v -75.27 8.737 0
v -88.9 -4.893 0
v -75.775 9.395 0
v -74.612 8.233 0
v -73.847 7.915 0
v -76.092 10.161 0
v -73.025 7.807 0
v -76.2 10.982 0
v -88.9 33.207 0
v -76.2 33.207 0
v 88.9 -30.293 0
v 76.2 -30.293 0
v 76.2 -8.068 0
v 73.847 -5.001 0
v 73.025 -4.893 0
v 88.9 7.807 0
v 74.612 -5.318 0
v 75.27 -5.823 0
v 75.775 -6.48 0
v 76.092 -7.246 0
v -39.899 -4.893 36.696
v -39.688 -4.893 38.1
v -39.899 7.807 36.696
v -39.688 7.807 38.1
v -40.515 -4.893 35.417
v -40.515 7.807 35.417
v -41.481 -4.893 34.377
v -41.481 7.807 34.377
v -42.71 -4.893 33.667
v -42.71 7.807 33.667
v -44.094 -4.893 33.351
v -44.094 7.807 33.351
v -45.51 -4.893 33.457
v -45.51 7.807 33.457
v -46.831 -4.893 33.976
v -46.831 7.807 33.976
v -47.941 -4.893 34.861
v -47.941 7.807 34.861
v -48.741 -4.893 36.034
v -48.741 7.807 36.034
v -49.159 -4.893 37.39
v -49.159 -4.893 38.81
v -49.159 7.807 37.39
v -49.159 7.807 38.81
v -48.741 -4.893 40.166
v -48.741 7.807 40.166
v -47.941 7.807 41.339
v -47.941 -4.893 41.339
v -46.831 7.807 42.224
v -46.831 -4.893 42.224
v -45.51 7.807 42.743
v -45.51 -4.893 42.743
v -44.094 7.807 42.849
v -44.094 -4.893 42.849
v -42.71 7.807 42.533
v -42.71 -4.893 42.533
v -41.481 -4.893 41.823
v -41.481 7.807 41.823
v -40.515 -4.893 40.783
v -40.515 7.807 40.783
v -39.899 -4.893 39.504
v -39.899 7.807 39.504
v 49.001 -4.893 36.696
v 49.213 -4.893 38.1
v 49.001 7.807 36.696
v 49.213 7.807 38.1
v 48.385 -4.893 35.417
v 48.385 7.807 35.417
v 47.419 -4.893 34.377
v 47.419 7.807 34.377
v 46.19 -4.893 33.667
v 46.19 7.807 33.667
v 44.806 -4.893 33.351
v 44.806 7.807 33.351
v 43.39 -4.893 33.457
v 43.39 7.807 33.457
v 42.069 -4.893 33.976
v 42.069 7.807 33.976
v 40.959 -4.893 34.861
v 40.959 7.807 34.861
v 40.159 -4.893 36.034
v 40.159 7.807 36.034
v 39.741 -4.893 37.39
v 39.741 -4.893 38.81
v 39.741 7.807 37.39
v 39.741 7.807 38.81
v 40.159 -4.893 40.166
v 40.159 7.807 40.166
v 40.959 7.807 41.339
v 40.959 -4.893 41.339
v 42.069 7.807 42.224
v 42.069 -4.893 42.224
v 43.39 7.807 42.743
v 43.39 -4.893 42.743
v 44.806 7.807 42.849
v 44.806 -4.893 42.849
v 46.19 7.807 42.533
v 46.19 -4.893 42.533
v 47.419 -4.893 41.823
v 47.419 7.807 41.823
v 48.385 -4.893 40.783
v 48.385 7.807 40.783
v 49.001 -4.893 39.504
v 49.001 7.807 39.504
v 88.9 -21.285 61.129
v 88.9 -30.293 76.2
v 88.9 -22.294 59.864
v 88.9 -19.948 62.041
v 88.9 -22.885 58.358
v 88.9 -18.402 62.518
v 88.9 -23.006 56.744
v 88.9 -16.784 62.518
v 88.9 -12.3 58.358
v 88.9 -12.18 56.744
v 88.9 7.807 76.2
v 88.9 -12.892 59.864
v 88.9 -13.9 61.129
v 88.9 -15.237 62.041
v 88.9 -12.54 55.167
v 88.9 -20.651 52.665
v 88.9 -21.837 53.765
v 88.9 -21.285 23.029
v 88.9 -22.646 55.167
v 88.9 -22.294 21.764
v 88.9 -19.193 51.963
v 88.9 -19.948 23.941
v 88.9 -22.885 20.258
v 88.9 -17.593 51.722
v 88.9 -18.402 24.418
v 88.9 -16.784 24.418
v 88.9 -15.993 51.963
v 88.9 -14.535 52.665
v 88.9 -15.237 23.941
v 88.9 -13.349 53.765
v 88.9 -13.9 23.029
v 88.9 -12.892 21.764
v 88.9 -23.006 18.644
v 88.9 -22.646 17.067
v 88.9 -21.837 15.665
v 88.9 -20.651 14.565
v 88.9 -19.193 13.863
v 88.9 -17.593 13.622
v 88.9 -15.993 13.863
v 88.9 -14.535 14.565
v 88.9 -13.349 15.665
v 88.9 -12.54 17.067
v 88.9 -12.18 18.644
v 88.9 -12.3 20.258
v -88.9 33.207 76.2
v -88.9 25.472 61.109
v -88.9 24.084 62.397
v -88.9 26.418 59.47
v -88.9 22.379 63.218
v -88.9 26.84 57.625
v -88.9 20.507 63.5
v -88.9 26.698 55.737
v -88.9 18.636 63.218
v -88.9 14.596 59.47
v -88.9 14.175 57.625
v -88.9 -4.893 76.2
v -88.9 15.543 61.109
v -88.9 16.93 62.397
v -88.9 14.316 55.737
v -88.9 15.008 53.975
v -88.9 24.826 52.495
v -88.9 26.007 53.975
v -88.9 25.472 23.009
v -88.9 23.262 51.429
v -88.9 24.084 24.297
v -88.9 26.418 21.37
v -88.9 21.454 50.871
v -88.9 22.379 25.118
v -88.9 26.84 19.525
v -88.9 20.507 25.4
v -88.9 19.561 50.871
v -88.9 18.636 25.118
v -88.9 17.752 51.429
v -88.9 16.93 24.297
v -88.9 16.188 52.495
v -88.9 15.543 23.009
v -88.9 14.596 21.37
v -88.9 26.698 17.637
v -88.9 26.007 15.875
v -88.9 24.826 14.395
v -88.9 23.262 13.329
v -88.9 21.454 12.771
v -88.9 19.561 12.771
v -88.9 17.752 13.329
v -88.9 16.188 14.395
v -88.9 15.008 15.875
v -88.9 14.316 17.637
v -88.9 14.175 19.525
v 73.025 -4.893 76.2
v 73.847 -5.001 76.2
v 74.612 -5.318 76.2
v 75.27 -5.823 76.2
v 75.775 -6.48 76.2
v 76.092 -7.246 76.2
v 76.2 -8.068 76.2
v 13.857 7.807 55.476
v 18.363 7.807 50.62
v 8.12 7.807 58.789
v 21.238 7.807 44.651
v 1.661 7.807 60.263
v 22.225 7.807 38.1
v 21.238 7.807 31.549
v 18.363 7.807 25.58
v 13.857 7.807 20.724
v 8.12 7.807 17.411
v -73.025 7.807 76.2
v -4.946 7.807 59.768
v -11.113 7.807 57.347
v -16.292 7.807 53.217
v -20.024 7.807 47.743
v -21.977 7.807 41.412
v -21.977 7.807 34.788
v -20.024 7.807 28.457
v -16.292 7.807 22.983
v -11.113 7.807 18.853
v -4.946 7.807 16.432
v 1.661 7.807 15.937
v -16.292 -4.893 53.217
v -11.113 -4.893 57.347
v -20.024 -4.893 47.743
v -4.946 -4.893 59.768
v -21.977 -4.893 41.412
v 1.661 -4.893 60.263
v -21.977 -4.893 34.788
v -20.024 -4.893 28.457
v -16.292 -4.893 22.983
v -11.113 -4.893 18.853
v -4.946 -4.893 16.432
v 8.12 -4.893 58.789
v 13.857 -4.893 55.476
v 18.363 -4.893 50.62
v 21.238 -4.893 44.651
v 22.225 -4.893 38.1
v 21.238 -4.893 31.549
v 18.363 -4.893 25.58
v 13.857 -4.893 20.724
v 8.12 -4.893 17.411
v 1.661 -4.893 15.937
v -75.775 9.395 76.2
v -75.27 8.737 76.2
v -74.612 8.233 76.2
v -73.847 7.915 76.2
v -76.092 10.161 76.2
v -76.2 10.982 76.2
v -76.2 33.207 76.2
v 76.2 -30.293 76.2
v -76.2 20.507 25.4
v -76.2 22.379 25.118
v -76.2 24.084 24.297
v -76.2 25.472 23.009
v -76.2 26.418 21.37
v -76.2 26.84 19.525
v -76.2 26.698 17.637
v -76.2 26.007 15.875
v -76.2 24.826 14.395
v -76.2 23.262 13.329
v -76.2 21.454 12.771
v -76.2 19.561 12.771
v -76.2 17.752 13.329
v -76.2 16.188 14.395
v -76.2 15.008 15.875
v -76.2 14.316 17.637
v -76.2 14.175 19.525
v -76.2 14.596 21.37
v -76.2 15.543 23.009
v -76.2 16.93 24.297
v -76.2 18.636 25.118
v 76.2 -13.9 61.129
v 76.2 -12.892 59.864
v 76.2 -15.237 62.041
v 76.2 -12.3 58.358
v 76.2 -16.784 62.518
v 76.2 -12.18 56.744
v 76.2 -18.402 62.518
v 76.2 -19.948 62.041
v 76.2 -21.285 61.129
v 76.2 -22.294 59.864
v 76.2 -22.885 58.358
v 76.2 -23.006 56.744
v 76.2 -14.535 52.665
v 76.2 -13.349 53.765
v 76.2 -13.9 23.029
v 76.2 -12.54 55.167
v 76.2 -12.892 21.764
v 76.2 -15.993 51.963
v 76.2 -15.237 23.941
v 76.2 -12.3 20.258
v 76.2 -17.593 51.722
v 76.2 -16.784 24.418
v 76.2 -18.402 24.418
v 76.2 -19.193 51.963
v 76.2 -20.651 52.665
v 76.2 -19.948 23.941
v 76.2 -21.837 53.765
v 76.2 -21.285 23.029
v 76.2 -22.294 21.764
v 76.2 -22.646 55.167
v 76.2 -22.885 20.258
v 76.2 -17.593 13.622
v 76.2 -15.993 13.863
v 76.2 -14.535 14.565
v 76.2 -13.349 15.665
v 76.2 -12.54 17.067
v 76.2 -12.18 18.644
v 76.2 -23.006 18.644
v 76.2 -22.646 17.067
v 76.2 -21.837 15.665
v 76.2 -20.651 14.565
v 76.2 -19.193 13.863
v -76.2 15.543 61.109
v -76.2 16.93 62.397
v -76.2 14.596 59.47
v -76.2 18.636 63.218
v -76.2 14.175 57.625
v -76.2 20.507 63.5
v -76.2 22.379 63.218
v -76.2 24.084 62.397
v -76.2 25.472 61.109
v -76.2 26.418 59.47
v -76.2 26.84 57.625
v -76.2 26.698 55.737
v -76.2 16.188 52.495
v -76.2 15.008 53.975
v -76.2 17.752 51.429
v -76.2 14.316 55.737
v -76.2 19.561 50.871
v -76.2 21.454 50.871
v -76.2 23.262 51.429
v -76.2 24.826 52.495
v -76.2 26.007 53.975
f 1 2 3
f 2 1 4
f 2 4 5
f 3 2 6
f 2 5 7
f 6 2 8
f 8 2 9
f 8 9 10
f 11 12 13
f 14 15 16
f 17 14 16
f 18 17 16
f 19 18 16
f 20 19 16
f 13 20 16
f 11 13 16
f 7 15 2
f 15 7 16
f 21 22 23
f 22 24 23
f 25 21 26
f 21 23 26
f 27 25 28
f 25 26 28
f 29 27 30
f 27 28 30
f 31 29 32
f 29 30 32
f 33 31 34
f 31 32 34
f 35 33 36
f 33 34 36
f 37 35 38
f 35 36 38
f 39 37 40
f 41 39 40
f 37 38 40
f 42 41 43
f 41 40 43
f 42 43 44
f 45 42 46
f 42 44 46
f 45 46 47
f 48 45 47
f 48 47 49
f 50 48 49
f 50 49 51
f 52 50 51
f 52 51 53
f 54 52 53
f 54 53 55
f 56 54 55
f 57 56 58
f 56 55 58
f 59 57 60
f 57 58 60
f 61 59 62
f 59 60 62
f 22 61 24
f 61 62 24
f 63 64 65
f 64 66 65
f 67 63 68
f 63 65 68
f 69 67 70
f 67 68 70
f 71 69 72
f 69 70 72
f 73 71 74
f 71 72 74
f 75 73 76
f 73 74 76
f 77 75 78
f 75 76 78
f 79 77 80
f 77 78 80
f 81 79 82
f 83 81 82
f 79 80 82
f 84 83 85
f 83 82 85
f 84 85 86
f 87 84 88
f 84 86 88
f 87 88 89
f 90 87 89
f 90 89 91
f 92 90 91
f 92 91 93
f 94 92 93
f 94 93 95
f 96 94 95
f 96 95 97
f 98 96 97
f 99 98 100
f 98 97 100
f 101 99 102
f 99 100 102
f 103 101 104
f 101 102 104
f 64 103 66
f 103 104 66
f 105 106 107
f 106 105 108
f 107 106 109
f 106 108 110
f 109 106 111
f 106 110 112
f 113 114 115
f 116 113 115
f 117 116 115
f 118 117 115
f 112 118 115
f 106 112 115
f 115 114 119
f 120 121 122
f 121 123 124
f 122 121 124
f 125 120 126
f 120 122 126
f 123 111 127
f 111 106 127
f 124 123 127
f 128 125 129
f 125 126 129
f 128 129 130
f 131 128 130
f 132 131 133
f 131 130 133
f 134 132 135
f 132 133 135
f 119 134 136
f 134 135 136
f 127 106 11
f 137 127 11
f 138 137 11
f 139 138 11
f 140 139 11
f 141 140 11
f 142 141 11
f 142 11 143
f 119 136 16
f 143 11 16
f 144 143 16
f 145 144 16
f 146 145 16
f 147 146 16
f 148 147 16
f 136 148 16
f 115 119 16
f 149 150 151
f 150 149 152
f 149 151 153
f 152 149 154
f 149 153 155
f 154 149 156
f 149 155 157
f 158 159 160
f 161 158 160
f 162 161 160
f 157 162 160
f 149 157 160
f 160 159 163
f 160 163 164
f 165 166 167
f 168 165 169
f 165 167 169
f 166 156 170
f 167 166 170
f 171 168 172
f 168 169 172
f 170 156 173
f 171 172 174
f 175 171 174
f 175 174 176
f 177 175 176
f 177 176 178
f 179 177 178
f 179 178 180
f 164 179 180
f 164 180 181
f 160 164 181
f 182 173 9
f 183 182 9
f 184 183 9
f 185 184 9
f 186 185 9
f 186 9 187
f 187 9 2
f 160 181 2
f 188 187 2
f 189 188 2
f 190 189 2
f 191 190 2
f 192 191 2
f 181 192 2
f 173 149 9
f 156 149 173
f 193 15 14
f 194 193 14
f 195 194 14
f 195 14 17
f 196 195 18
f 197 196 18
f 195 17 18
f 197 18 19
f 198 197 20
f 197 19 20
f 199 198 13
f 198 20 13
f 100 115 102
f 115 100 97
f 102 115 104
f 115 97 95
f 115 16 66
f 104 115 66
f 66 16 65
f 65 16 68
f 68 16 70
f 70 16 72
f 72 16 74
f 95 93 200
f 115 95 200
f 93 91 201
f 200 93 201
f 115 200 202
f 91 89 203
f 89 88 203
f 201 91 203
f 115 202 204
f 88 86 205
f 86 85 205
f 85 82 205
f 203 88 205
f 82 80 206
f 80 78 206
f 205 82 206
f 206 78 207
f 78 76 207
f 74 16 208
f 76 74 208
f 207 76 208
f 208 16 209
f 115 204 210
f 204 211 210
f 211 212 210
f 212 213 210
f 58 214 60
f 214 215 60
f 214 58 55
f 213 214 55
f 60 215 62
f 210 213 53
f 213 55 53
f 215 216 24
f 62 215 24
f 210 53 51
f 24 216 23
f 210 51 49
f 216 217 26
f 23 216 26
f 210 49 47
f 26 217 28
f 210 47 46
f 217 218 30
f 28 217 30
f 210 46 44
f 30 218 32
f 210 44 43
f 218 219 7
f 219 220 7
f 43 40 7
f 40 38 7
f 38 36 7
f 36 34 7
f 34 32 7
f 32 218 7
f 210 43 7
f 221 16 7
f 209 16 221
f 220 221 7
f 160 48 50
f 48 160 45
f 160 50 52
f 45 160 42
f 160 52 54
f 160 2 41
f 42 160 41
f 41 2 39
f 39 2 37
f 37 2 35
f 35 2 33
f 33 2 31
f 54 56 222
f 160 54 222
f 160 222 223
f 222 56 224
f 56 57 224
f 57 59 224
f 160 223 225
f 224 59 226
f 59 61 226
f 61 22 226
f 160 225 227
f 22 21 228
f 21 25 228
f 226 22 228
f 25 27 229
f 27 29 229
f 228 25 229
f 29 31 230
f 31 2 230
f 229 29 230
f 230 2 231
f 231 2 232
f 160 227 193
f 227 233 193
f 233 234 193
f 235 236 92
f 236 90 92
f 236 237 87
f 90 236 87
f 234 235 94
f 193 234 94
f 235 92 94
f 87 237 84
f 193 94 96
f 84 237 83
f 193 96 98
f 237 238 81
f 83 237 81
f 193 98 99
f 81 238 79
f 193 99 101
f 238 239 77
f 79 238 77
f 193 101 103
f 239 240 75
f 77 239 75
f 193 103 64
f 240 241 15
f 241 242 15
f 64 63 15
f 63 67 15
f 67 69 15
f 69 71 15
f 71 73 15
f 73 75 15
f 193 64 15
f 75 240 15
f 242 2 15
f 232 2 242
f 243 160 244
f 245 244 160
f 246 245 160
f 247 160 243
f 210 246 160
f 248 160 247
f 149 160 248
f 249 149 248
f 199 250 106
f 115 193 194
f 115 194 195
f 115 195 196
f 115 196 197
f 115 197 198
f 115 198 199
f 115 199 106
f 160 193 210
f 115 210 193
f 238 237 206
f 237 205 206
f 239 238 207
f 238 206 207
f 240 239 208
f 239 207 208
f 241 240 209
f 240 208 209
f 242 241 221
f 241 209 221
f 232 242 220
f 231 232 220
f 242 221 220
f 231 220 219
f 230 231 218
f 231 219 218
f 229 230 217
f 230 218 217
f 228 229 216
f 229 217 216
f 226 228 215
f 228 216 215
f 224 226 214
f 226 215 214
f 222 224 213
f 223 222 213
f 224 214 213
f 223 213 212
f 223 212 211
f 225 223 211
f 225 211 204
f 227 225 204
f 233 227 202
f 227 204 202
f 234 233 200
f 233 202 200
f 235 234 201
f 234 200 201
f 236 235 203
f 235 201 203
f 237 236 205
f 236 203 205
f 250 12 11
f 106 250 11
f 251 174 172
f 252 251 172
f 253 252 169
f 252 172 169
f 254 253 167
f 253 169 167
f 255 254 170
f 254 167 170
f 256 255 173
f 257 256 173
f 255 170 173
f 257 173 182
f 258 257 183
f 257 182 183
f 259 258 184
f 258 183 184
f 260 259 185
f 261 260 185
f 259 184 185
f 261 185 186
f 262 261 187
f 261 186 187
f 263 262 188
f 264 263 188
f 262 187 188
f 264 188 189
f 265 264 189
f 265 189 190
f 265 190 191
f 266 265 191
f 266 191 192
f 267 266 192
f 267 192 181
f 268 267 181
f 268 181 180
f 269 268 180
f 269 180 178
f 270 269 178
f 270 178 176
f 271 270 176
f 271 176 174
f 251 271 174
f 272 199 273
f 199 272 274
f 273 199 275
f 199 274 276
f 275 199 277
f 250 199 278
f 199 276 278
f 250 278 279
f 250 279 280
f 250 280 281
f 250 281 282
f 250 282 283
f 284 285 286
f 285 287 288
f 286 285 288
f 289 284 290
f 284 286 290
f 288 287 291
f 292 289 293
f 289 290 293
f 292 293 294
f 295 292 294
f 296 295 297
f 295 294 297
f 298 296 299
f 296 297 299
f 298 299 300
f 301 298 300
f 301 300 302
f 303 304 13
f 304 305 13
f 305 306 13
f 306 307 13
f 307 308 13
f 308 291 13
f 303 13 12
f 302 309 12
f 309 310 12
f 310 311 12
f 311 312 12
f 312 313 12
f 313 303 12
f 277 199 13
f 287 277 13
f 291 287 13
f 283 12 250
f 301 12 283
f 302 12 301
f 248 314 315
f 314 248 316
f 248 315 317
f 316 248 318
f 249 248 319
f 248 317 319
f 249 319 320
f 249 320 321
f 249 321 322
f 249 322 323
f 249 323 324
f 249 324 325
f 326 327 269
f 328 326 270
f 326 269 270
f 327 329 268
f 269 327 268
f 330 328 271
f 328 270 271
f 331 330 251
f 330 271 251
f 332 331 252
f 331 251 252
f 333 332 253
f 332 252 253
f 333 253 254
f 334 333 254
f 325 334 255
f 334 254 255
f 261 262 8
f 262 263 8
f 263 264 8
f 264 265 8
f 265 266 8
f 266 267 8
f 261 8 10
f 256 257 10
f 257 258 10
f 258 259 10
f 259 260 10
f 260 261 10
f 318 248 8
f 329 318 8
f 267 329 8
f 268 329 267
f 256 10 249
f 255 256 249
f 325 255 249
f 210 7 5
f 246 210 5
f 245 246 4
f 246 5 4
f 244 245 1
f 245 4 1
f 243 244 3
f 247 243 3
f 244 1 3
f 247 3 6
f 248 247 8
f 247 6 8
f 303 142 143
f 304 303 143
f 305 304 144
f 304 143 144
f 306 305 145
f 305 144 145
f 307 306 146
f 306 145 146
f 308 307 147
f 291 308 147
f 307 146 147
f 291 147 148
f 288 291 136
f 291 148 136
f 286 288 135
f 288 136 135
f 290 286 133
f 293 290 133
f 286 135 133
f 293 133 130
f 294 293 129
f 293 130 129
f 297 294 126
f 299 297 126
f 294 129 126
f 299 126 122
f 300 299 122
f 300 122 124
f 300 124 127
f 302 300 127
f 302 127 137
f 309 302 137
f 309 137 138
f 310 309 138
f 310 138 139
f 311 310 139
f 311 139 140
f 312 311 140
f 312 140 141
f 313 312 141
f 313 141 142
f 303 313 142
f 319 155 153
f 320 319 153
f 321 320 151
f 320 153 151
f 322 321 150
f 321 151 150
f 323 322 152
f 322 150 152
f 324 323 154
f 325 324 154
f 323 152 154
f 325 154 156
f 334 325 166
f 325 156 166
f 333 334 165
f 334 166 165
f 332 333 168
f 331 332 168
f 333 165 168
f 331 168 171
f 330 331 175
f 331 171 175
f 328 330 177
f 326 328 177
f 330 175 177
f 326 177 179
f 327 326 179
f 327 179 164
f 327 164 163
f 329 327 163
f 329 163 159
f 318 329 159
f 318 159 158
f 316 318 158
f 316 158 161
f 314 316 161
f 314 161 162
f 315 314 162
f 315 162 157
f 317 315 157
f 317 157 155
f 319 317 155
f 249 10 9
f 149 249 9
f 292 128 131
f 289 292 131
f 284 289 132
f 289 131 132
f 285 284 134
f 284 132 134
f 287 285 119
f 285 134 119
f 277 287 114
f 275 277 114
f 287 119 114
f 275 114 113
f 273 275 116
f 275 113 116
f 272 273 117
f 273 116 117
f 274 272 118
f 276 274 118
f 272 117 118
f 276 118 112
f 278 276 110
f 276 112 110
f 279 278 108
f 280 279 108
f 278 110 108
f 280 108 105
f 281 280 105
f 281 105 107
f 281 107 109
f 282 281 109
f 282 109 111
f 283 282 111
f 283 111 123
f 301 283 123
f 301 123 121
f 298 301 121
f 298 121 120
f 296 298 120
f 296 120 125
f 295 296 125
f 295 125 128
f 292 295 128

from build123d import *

# Parameters (mm, degrees)
BOSS_EXTRUDE1_DEPTH     = 76.2
SKETCH2_R               = 22.225
SKETCH2_R_2             = 4.7625
CUT_EXTRUDE2_DEPTH      = 34.20727615
CUT_EXTRUDE2_DEPTH_BACK = 31.29272385
CUT_EXTRUDE3_REACH      = 179.8
SKETCH3_R               = 6.35
SKETCH5_R               = 5.428392571
CUT_EXTRUDE4_DEPTH      = 76.2


with BuildPart() as part:
    # Sketch1 → Boss-Extrude1 (new body)
    with BuildSketch(Plane.XY):
        with BuildLine():
            Line((-88.9, -4.89272385), (73.025, -4.89272385))
            ThreePointArc((73.025, -4.89272385), (75.27006403, -5.82265982), (76.2, -8.06772385))
            Line((76.2, -8.06772385), (76.2, -30.29272385))
            Line((76.2, -30.29272385), (88.9, -30.29272385))
            Line((88.9, -30.29272385), (88.9, -4.89272385))
            Line((88.9, -4.89272385), (88.9, 7.80727615))
            Line((88.9, 7.80727615), (-73.025, 7.80727615))
            ThreePointArc((-73.025, 7.80727615), (-75.27006403, 8.73721212), (-76.2, 10.98227615))
            Line((-76.2, 10.98227615), (-76.2, 33.20727615))
            Line((-76.2, 33.20727615), (-88.9, 33.20727615))
            Line((-88.9, 33.20727615), (-88.9, 4.89272385))
            Line((-88.9, 4.89272385), (-88.9, -4.89272385))
        make_face()
    extrude(amount=BOSS_EXTRUDE1_DEPTH)

    # Sketch2 → Cut-Extrude2 (cut, two sides)
    with BuildSketch(Plane(origin=(0, 0, 0), x_dir=(1, 0, 0), z_dir=(0, 1, 0))) as cut_extrude2_sk:
        with Locations((0, -38.1)):
            Circle(SKETCH2_R)
        with Locations((-44.45, -38.1)):
            Circle(SKETCH2_R_2)
        with Locations((44.45, -38.1)):
            Circle(SKETCH2_R_2)
    extrude(amount=CUT_EXTRUDE2_DEPTH, mode=Mode.SUBTRACT)
    extrude(cut_extrude2_sk.sketch, amount=-CUT_EXTRUDE2_DEPTH_BACK, mode=Mode.SUBTRACT)

    # Sketch3 → Cut-Extrude3 (cut, up to next)
    with BuildSketch(Plane.ZY.offset(88.9), mode=Mode.PRIVATE) as cut_extrude3_sk1:
        with Locations((19.05, 20.50727615)):
            Circle(SKETCH3_R)
    cut_extrude3_tool1 = extrude(cut_extrude3_sk1.sketch, amount=-CUT_EXTRUDE3_REACH, mode=Mode.PRIVATE) & part.part
    add(cut_extrude3_tool1.solids().sort_by_distance((-88.9, 20.507276, 19.05))[0], mode=Mode.SUBTRACT)
    # Sketch3 → Cut-Extrude3 (cut, up to next)
    with BuildSketch(Plane.ZY.offset(88.9), mode=Mode.PRIVATE) as cut_extrude3_sk2:
        with Locations((57.15, 20.50727615)):
            Circle(SKETCH3_R)
    cut_extrude3_tool2 = extrude(cut_extrude3_sk2.sketch, amount=-CUT_EXTRUDE3_REACH, mode=Mode.PRIVATE) & part.part
    add(cut_extrude3_tool2.solids().sort_by_distance((-88.9, 20.507276, 57.15))[0], mode=Mode.SUBTRACT)

    # Sketch5 → Cut-Extrude4 (cut)
    with BuildSketch(Plane(origin=(88.9, 0, 0), x_dir=(0, 0, -1), z_dir=(1, 0, 0))):
        with Locations((-57.15, -17.59272385)):
            Circle(SKETCH5_R)
        with Locations((-19.05, -17.59272385)):
            Circle(SKETCH5_R)
    extrude(amount=-CUT_EXTRUDE4_DEPTH, mode=Mode.SUBTRACT)


solid = part.part
